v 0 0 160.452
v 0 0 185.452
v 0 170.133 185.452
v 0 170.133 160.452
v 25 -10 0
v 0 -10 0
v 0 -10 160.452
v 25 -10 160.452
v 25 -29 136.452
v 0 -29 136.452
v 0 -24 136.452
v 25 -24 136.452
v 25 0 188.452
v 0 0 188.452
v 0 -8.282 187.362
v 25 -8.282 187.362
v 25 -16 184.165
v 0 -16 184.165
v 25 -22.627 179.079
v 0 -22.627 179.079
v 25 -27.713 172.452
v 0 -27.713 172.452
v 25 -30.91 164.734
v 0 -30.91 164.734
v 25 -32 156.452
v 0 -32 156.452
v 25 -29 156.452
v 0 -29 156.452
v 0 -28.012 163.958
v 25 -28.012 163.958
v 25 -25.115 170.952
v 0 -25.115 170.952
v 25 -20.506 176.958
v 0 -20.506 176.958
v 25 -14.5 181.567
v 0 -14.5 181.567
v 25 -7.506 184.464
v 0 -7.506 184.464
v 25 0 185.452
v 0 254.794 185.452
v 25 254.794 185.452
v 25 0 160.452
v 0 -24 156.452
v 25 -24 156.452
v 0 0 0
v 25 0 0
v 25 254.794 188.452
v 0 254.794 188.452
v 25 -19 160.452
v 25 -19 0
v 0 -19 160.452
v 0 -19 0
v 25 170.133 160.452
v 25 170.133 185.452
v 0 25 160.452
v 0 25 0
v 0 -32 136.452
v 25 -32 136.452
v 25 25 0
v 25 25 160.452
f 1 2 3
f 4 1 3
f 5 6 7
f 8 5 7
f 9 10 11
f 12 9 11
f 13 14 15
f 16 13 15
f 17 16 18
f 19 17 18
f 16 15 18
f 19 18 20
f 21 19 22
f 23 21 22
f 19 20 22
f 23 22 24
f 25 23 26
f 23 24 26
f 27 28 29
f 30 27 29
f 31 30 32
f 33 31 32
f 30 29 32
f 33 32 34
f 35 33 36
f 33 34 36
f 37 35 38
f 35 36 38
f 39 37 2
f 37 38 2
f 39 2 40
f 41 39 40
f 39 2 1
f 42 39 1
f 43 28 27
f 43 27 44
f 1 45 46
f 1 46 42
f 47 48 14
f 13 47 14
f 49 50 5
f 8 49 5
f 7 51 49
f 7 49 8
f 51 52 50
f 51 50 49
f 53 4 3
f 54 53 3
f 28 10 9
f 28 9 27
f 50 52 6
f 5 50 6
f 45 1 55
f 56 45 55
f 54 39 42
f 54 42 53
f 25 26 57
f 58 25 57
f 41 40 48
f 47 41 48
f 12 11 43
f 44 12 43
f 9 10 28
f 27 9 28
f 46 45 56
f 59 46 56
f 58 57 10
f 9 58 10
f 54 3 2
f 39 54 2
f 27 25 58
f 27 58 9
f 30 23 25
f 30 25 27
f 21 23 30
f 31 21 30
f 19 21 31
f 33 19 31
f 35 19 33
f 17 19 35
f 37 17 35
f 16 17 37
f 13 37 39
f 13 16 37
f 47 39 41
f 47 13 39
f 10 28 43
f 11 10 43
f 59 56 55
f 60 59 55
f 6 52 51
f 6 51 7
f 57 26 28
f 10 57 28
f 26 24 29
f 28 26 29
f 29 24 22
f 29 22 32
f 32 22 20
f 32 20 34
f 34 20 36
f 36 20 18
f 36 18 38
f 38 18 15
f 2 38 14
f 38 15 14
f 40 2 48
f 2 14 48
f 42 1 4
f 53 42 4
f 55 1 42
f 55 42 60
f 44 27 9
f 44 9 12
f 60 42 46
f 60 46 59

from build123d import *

# Parameters (mm, degrees)
F1_DEPTH = 25
F2_DEPTH = 25
F0_W     = 25
F0_H     = 160.451985
F3_DEPTH = 25
F0_W_2   = 9
F4_DEPTH = 25
F0_W_3   = 5
F0_H_2   = 20
F5_DEPTH = 25


with BuildPart() as f1:
    # F0 (on Right) → F1 (new body)
    with BuildSketch(Plane.YZ):
        with BuildLine():
            ThreePointArc((-29, 156.451985), (-20.506097, 176.958082), (0, 185.451985))
            Line((0, 185.451985), (170.133058, 185.451985))
            Line((170.133058, 185.451985), (254.793923, 185.451985))
            Line((254.793923, 185.451985), (254.793923, 188.451985))
            Line((254.793923, 188.451985), (0, 188.451985))
            ThreePointArc((0, 188.451985), (-22.627417, 179.079402), (-32, 156.451985))
            Line((-32, 156.451985), (-32, 136.451985))
            Line((-32, 136.451985), (-29, 136.451985))
            Line((-29, 136.451985), (-29, 156.451985))
        make_face()
    extrude(amount=F1_DEPTH)


with BuildPart() as f2:
    # F0 (on Right) → F2 (new body)
    with BuildSketch(Plane.YZ):
        Polygon((0, 185.451985), (0, 160.451985), (25, 160.451985), (170.133058, 160.451985), (170.133058, 185.451985), align=None)
    extrude(amount=F2_DEPTH)


with BuildPart() as f3:
    # F0 (on Right) → F3 (new body)
    with BuildSketch(Plane.YZ):
        with Locations((12.5, 80.225992)):
            Rectangle(F0_W, F0_H)
    extrude(amount=F3_DEPTH)


with BuildPart() as f4:
    # F0 (on Right) → F4 (new body)
    with BuildSketch(Plane.YZ):
        with Locations((-14.5, 80.225992)):
            Rectangle(F0_W_2, F0_H)
    extrude(amount=F4_DEPTH)


with BuildPart() as f5:
    # F0 (on Right) → F5 (new body)
    with BuildSketch(Plane.YZ):
        with Locations((-26.5, 146.451985)):
            Rectangle(F0_W_3, F0_H_2)
    extrude(amount=F5_DEPTH)


solid = Compound([f1.part, f2.part, f3.part, f4.part, f5.part])
